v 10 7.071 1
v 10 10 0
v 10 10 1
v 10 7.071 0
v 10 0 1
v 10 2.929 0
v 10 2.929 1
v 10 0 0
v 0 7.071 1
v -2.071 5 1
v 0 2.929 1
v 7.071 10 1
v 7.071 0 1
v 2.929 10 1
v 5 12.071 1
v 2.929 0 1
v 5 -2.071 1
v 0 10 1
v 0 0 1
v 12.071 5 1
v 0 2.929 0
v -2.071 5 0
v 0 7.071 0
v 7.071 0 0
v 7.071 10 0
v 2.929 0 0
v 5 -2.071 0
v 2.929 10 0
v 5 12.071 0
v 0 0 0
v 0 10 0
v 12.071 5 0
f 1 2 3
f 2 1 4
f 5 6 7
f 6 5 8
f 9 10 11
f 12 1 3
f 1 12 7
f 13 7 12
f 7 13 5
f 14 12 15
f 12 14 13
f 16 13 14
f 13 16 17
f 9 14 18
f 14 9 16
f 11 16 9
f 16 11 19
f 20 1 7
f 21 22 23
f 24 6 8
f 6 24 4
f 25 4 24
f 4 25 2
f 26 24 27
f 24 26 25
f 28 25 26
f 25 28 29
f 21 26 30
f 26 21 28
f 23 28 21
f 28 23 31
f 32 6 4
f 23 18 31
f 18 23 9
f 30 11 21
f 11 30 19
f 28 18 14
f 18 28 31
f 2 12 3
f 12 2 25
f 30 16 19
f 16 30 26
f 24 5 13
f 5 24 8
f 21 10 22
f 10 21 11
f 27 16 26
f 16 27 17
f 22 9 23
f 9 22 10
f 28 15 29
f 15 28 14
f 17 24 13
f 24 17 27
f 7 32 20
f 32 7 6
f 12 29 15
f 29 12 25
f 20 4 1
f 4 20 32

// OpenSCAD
// file: utils.scad
///< Utilities

function rand_clr() = rands( 0,1,3 );

///< Length conversions
function in2mm( i ) = ( i * 25.4 ); 
function mm2in( m ) = ( m / 25.4 );

/// This is pulled from stackoverflow
/// https://stackoverflow.com/questions/45826208/openscad-rotating-around-a-particular-point

// rotate as per a, v, but around point pt
module rotate_about_pt(a, v, pt) {
    translate(pt)
        rotate(a,v)
            translate(-pt)
                children();   
}
// main file
///< Test basics
use <utils.scad>

color("Red")cube([10,10,1]);
rotate_about_pt(45,0,[5,5,0]) cube([10,10,1]);
